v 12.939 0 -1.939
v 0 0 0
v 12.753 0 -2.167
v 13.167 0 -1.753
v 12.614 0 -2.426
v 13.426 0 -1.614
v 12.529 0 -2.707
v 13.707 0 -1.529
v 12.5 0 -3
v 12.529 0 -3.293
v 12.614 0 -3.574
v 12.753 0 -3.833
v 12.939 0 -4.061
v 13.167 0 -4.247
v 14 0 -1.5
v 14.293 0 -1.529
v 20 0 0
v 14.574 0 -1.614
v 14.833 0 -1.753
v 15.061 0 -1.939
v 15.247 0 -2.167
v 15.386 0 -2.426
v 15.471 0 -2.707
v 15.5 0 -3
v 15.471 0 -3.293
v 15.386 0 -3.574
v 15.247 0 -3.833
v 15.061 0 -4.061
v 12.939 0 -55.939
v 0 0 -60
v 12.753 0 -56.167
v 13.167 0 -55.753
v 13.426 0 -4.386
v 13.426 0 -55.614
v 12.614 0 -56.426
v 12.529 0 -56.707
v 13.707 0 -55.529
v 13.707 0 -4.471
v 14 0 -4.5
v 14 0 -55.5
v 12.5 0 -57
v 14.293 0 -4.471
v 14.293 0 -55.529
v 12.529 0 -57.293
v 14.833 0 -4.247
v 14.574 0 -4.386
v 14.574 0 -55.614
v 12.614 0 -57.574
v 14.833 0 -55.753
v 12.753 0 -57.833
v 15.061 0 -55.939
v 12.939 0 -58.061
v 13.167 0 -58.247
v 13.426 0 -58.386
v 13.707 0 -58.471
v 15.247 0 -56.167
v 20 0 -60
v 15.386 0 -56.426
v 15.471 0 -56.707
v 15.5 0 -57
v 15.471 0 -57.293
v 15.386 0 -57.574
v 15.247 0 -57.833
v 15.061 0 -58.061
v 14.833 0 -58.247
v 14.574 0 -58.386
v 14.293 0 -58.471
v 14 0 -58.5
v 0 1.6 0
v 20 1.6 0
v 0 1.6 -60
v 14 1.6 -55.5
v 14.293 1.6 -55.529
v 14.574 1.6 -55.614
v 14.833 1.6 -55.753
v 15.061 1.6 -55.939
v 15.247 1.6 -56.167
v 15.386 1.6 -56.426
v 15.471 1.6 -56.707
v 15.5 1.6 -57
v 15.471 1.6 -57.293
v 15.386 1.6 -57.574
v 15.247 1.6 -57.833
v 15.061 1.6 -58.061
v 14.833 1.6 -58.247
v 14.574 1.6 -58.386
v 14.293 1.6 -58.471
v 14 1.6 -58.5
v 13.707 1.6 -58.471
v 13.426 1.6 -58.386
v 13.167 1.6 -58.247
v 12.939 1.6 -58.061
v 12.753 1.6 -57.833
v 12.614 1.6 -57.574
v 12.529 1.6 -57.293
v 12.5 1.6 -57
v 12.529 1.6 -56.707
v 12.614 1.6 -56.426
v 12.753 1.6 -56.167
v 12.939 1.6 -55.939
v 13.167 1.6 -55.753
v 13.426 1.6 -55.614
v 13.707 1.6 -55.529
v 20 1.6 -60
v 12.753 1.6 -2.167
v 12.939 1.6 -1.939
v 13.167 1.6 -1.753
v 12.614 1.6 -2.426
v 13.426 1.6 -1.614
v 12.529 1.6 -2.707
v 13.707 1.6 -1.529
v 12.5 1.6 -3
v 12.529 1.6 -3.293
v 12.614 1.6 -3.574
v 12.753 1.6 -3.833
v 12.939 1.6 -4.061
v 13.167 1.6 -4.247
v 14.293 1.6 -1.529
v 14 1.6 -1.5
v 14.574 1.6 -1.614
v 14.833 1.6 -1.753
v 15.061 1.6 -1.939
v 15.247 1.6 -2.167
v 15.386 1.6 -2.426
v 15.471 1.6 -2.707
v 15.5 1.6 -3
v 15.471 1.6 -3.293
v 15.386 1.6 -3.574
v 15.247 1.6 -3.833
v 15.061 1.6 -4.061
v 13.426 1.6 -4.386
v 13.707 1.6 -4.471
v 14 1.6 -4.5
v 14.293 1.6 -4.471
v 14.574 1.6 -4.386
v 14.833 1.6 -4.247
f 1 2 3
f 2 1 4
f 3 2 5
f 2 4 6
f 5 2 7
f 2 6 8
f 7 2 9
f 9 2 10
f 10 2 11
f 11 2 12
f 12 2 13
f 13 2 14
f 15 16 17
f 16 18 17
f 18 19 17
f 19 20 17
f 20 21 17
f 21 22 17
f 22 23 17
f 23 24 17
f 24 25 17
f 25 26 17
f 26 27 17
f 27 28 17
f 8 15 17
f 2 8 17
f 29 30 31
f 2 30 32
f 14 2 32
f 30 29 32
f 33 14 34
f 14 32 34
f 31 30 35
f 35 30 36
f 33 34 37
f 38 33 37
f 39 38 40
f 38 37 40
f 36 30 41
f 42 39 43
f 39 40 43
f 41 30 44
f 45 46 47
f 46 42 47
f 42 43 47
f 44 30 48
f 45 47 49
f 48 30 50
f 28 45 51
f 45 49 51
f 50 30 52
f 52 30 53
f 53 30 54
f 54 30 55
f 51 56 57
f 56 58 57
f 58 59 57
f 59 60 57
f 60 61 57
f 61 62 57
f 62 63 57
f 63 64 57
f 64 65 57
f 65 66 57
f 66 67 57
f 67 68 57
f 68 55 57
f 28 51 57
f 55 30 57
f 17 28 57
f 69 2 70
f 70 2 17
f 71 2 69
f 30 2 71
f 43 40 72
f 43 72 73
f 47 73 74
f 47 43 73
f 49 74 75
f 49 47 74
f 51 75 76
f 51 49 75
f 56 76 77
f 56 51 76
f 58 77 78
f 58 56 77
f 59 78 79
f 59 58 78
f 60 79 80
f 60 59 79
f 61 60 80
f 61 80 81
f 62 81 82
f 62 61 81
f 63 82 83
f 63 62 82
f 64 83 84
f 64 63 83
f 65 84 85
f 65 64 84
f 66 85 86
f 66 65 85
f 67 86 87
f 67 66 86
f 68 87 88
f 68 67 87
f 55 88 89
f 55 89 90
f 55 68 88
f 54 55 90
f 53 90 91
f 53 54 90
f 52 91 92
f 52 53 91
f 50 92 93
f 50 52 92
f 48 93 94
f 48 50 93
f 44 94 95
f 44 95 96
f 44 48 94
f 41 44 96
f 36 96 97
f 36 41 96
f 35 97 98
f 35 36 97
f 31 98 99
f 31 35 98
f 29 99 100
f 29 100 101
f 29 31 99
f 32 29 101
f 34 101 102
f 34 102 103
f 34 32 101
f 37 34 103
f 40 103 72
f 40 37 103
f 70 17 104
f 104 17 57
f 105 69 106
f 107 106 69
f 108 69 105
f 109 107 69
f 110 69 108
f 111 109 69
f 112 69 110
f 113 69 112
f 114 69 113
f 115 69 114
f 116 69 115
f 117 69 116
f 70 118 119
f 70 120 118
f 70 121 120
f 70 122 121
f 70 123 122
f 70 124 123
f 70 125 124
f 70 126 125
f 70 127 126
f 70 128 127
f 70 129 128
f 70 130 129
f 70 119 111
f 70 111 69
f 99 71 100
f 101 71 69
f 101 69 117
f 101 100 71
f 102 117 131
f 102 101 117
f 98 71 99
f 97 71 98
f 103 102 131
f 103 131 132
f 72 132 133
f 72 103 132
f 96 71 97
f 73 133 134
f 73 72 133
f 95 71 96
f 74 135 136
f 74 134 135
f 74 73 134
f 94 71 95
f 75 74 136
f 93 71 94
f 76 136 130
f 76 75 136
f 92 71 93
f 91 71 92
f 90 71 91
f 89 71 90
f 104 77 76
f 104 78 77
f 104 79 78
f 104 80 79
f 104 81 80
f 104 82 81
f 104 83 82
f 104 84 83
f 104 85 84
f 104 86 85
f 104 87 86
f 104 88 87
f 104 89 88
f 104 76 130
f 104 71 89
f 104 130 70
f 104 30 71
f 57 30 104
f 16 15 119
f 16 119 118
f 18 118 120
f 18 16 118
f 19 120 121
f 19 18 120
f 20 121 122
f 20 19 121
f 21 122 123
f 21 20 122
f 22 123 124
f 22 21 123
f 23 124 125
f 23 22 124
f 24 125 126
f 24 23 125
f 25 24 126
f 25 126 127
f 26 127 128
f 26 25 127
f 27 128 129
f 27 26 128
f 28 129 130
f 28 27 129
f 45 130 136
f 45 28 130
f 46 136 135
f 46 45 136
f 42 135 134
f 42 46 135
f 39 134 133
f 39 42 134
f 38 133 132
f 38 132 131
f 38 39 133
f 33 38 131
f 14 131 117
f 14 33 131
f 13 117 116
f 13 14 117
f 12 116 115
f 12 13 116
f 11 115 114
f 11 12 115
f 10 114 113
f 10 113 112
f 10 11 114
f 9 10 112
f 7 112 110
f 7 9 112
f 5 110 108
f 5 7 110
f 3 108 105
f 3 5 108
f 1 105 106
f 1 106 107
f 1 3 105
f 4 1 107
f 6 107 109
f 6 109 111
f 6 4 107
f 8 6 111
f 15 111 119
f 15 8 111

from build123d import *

# Parameters (mm, degrees)
SKETCH1_W       = 20
SKETCH1_H       = 60
SKETCH1_R       = 1.5
PCB_BOARD_DEPTH = 1.6


with BuildPart() as part:
    # Sketch1 → pcb_board (new body)
    with BuildSketch(Plane(origin=(0, 0, 0), x_dir=(1, 0, 0), z_dir=(0, 1, 0))):
        with Locations((10, 30)):
            Rectangle(SKETCH1_W, SKETCH1_H)
        with Locations(Location((14, 3, 0), (0, 0, 270))):
            Circle(SKETCH1_R, mode=Mode.SUBTRACT)
        with Locations(Location((14, 57, 0), (0, 0, 270))):
            Circle(SKETCH1_R, mode=Mode.SUBTRACT)
    extrude(amount=PCB_BOARD_DEPTH)


solid = part.part
